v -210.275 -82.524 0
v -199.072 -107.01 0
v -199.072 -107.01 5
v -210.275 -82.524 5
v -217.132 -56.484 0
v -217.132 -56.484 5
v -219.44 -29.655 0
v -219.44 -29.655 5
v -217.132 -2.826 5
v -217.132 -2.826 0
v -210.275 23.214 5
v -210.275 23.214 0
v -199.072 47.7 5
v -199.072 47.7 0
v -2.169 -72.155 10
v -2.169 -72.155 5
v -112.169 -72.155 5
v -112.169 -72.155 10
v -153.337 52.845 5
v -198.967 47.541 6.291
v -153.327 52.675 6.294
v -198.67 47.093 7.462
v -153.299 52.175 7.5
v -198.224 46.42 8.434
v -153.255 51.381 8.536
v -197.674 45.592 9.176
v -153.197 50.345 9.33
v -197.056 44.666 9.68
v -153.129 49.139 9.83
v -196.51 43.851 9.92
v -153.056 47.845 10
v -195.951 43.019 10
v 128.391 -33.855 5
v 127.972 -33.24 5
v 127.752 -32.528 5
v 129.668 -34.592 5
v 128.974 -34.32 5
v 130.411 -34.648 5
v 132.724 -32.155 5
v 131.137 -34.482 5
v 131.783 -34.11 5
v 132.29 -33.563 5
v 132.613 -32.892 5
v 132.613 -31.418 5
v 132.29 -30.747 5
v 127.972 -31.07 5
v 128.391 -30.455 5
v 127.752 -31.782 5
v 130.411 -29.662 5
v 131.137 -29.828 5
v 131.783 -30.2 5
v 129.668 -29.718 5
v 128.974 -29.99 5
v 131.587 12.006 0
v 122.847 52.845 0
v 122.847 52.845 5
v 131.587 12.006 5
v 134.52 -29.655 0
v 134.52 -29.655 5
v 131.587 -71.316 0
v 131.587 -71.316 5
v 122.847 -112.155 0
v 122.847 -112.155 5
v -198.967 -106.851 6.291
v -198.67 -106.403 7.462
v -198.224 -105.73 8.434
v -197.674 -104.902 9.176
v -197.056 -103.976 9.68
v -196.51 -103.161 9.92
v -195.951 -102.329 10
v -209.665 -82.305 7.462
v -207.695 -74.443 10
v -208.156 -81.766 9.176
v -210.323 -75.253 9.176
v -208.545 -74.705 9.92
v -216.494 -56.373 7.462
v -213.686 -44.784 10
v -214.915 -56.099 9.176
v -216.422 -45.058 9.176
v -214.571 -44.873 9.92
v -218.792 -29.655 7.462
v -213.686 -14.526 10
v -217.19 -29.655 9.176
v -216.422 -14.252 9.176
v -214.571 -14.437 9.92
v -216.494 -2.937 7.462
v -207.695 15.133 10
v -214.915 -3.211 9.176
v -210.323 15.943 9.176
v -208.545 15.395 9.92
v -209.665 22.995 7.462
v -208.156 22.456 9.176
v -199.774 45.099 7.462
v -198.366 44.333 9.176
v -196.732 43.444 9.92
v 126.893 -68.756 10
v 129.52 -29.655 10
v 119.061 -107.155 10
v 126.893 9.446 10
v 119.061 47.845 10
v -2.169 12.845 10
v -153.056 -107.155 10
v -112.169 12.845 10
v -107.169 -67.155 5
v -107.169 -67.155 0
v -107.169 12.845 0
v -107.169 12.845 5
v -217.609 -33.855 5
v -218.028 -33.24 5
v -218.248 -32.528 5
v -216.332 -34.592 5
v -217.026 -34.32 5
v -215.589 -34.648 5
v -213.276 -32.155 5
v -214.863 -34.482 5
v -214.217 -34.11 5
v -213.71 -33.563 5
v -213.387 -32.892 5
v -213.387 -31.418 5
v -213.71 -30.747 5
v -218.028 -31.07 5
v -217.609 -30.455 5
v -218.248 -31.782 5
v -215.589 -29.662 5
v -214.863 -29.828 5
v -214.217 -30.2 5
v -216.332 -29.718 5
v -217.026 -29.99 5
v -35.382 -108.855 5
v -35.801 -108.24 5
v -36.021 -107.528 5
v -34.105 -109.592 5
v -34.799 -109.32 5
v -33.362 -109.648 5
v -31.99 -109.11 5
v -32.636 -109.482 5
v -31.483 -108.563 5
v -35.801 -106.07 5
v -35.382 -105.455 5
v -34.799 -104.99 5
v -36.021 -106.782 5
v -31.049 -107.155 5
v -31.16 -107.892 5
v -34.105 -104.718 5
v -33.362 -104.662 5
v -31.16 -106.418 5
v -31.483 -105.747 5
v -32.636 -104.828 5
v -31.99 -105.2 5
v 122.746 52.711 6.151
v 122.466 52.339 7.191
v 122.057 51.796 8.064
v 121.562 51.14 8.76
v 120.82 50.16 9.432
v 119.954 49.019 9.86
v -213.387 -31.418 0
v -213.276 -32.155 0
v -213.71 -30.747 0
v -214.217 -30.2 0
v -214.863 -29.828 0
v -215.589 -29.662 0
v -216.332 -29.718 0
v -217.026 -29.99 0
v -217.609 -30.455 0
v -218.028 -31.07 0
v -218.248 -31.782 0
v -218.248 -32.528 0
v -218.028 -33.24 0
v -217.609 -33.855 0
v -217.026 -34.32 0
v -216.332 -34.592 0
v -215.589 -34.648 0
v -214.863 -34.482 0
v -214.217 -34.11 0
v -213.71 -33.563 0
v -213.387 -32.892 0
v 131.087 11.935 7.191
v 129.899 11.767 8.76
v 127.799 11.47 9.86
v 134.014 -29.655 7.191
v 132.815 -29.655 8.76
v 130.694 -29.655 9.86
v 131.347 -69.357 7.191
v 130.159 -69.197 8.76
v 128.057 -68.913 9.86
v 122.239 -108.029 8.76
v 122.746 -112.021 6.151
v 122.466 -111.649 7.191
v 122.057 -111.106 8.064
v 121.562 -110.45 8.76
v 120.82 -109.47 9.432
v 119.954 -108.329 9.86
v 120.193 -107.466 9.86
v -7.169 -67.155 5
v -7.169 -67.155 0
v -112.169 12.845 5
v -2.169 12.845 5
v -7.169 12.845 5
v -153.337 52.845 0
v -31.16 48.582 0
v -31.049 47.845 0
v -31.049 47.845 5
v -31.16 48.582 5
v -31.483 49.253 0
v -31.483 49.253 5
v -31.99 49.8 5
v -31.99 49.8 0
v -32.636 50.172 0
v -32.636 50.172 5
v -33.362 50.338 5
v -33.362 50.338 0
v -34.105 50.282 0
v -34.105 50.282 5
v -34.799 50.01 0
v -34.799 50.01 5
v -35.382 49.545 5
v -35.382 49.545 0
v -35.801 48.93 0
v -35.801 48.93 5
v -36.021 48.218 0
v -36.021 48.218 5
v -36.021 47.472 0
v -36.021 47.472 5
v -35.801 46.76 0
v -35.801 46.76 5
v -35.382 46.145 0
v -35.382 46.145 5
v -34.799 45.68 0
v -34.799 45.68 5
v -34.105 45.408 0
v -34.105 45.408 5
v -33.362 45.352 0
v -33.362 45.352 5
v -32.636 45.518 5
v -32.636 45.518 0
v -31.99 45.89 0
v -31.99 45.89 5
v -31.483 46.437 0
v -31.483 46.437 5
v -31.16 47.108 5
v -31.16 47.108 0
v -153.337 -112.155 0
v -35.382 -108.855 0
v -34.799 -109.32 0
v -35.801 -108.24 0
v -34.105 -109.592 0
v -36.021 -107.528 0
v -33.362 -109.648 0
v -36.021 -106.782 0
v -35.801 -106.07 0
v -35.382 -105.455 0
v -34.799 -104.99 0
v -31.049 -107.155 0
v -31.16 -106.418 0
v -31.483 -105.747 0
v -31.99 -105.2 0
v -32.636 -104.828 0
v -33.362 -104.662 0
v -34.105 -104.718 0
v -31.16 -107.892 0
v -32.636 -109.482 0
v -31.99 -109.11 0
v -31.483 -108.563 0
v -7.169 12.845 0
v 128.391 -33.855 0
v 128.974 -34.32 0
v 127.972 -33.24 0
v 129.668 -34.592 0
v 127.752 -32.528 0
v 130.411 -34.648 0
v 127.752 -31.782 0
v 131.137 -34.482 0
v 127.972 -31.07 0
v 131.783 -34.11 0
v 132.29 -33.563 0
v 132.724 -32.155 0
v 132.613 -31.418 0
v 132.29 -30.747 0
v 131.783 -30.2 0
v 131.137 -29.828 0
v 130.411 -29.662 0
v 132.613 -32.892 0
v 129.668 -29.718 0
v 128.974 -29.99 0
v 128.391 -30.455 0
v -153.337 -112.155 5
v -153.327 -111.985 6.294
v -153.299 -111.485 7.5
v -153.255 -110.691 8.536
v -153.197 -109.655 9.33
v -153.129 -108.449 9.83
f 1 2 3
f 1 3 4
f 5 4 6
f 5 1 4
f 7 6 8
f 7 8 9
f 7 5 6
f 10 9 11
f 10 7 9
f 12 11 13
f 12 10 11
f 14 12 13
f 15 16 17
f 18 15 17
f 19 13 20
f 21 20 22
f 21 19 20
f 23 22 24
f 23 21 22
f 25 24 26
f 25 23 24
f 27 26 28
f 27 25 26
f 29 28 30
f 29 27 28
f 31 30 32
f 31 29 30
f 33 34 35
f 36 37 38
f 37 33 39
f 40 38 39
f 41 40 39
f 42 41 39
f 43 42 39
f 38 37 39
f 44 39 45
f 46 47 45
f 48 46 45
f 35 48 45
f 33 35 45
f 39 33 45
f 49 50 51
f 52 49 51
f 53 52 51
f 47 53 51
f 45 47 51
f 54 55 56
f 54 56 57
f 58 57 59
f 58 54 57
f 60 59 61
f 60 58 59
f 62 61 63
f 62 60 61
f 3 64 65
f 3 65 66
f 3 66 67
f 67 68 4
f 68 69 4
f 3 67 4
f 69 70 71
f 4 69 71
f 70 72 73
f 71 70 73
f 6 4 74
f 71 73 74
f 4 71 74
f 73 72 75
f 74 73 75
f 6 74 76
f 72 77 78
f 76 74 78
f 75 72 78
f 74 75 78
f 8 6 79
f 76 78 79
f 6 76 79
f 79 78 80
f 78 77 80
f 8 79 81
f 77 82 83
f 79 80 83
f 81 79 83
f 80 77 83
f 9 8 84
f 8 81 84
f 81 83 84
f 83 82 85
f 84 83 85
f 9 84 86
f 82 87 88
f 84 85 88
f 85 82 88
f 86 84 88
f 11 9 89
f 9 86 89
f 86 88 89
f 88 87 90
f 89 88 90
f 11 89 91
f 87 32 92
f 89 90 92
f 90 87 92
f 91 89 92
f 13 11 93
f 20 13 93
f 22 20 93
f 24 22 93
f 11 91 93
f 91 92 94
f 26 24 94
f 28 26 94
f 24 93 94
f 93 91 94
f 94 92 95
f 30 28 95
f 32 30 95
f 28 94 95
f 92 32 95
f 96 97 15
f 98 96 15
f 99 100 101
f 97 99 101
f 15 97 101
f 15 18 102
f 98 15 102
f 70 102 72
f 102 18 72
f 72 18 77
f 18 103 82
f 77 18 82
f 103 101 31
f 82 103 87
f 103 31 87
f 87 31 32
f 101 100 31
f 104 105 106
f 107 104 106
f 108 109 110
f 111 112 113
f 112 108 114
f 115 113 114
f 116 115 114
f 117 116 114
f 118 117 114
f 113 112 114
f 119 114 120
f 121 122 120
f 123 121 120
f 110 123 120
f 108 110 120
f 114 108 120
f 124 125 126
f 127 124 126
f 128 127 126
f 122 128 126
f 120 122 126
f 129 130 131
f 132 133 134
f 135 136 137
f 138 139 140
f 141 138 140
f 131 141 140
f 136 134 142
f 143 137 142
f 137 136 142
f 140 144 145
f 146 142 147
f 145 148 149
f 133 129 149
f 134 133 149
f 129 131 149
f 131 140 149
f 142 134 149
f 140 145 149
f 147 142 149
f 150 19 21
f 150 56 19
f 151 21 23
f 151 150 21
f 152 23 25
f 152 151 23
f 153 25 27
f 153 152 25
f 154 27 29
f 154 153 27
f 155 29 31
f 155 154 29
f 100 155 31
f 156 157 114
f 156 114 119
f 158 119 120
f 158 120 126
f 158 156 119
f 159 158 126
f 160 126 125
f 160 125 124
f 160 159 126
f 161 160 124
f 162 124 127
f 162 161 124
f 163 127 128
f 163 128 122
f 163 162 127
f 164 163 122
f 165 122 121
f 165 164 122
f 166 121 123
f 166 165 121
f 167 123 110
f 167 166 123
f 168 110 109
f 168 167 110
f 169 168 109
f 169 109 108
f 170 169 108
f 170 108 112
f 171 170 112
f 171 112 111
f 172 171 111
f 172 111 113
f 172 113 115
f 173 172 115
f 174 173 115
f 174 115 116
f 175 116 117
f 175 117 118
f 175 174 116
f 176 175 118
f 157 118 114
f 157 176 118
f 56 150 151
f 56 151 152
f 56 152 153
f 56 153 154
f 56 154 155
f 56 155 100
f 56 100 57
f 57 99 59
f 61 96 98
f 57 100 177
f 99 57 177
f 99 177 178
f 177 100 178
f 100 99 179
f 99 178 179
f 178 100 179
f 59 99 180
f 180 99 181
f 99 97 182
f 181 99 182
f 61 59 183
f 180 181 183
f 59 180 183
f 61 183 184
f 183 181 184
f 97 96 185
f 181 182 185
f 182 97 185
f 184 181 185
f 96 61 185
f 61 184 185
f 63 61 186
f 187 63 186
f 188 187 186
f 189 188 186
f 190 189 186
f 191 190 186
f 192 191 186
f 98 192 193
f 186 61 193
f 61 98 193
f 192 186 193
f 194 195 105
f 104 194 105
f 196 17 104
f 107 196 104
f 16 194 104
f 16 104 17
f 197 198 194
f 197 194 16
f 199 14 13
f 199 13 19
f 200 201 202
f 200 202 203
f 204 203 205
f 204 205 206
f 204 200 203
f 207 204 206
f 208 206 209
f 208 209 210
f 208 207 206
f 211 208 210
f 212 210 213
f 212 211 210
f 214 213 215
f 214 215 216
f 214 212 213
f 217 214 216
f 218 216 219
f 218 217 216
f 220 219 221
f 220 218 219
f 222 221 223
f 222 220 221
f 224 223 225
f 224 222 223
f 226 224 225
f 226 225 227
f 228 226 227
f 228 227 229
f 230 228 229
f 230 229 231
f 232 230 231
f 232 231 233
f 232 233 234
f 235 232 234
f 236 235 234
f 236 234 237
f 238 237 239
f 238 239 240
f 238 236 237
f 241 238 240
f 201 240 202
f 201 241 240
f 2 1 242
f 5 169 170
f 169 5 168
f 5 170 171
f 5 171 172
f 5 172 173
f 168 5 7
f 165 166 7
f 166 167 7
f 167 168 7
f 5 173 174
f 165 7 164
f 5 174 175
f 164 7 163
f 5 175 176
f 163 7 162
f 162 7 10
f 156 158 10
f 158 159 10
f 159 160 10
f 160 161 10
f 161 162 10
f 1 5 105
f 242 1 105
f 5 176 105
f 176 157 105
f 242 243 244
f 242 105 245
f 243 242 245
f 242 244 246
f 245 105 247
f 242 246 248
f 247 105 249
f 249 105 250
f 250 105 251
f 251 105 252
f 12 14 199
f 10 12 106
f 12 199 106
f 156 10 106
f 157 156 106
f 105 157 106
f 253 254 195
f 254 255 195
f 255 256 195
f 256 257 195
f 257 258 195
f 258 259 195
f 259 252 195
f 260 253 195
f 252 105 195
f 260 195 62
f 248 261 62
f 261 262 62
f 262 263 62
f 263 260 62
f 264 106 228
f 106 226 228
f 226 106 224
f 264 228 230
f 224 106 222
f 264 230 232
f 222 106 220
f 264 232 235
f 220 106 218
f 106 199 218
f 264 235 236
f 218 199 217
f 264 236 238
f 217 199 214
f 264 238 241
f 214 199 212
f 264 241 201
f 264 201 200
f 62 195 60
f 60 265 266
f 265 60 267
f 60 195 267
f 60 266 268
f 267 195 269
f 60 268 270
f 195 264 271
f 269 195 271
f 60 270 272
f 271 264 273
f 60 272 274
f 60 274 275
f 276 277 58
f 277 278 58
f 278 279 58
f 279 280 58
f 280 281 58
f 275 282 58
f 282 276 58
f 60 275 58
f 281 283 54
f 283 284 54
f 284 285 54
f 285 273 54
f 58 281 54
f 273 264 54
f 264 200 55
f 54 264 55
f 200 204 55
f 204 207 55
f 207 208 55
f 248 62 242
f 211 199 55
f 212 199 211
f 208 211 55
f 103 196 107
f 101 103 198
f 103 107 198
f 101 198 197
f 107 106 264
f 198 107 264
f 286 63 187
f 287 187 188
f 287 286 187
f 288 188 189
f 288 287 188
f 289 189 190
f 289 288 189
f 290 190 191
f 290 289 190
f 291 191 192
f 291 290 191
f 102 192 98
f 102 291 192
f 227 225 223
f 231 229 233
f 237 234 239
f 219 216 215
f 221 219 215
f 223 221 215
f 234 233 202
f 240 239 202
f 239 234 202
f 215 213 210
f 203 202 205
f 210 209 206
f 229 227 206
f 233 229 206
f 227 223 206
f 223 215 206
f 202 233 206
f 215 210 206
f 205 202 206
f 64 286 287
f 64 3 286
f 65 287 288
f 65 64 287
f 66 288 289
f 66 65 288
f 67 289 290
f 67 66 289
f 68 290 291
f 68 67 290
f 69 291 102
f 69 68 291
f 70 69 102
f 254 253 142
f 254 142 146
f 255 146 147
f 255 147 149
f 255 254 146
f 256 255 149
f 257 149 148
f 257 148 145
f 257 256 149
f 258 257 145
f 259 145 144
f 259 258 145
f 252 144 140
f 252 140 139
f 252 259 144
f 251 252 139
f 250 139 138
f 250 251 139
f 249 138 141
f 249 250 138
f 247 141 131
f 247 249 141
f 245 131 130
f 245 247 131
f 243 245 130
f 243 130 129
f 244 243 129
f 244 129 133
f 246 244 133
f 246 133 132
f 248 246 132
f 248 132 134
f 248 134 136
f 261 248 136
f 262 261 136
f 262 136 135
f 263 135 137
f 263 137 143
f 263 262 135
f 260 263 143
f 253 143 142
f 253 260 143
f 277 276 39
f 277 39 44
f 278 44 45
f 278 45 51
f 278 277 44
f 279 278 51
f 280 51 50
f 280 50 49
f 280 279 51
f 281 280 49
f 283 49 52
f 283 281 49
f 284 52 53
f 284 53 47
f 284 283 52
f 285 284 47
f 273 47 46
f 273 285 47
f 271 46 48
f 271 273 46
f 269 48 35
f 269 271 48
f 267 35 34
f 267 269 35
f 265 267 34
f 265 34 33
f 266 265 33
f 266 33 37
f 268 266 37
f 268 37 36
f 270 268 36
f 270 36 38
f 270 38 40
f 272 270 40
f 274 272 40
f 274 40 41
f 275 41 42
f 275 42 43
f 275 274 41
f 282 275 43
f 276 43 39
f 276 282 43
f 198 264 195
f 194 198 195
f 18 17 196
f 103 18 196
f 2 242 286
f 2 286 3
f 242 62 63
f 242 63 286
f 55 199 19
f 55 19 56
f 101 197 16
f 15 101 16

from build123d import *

# Parameters (mm, degrees)
EXTRU_MINCE1_DEPTH      = 10
ESQUISSE1_25_W          = 110
ESQUISSE1_25_H          = 85
BOSS_EXTRU_3_DEPTH      = 10
ESQUISSE1_26_R          = 2.5
ENL_V_MAT_EXTRU_1_DEPTH = 5
ESQUISSE1_27_R          = 2.5
ENL_V_MAT_EXTRU_2_DEPTH = 5
ESQUISSE1_28_R          = 2.5
ENL_V_MAT_EXTRU_3_DEPTH = 5
ESQUISSE1_29_R          = 2.5
ENL_V_MAT_EXTRU_4_DEPTH = 5
CONG_5_R                = 5
BOSS_EXTRU_4_DEPTH      = 5


with BuildPart() as part:
    # Esquisse1 → Extru.-Mince1 (new body)
    with BuildSketch(Plane.XY):
        with BuildLine():
            Line((-199.071776485, 47.699787448), (-153.336718001, 52.844981528))
            Line((-153.336718001, 52.844981528), (122.846559315, 52.844981528))
            ThreePointArc((122.846559315, 52.844981528), (134.520037722, -29.655018472), (122.846559315, -112.155018472))
            Line((122.846559315, -112.155018472), (-153.336718001, -112.155018472))
            Line((-153.336718001, -112.155018472), (-199.071776485, -107.009824393))
            ThreePointArc((-199.071776485, -107.009824393), (-219.440219924, -29.655018472), (-199.071776485, 47.699787448))
        make_face()
        with BuildLine():
            Line((-192.775986612, 38.344981528), (-152.775986612, 42.844981528))
            Line((-152.775986612, 42.844981528), (115.224013388, 42.844981528))
            ThreePointArc((115.224013388, 42.844981528), (124.520037722, -29.655018472), (115.224013388, -102.155018472))
            Line((115.224013388, -102.155018472), (-152.775986612, -102.155018472))
            Line((-152.775986612, -102.155018472), (-192.775986612, -97.655018472))
            ThreePointArc((-192.775986612, -97.655018472), (-209.440219924, -29.655018472), (-192.775986612, 38.344981528))
        make_face(mode=Mode.SUBTRACT)
    extrude(amount=EXTRU_MINCE1_DEPTH)

    # Esquisse1<25> → Boss.-Extru.3 (add)
    with BuildSketch(Plane.XY):
        with BuildLine():
            Line((-152.775986612, 42.844981528), (-192.775986612, 38.344981528))
            ThreePointArc((-192.775986612, 38.344981528), (-209.440219924, -29.655018472), (-192.775986612, -97.655018472))
            Line((-192.775986612, -97.655018472), (-152.775986612, -102.155018472))
            Line((-152.775986612, -102.155018472), (115.224013388, -102.155018472))
            ThreePointArc((115.224013388, -102.155018472), (124.520037722, -29.655018472), (115.224013388, 42.844981528))
            Line((115.224013388, 42.844981528), (-152.775986612, 42.844981528))
        make_face()
        with Locations((-57.169243918, -29.655018472)):
            Rectangle(ESQUISSE1_25_W, ESQUISSE1_25_H, mode=Mode.SUBTRACT)
    extrude(amount=BOSS_EXTRU_3_DEPTH)

    # Esquisse1<26> → Enlèv. mat.-Extru.1 (cut)
    with BuildSketch(Plane.XY):
        with Locations((130.224013388, -32.155018472)):
            Circle(ESQUISSE1_26_R)
    extrude(amount=ENL_V_MAT_EXTRU_1_DEPTH, mode=Mode.SUBTRACT)

    # Esquisse1<27> → Enlèv. mat.-Extru.2 (cut)
    with BuildSketch(Plane.XY):
        with Locations((-33.549027095, -107.155018472)):
            Circle(ESQUISSE1_27_R)
    extrude(amount=ENL_V_MAT_EXTRU_2_DEPTH, mode=Mode.SUBTRACT)

    # Esquisse1<28> → Enlèv. mat.-Extru.3 (cut)
    with BuildSketch(Plane.XY):
        with Locations((-33.549027095, 47.844981528)):
            Circle(ESQUISSE1_28_R)
    extrude(amount=ENL_V_MAT_EXTRU_3_DEPTH, mode=Mode.SUBTRACT)

    # Esquisse1<29> → Enlèv. mat.-Extru.4 (cut)
    with BuildSketch(Plane.XY):
        with Locations((-215.775986612, -32.155018472)):
            Circle(ESQUISSE1_29_R)
    extrude(amount=ENL_V_MAT_EXTRU_4_DEPTH, mode=Mode.SUBTRACT)

    # Congé5
    cong_5_edges = [part.edges().sort_by_distance(p)[0] for p in [
        (-219.440219924, -29.655018472, 10),
        (-176.204247243, 50.272384488, 10),
        (-15.245079343, 52.844981528, 10),
        (134.520037722, -29.655018472, 10),
        (-15.245079343, -112.155018472, 10),
        (-176.204247243, -109.582421433, 10),
    ]]
    fillet(cong_5_edges, radius=CONG_5_R)

    # Esquisse1<30> → Boss.-Extru.4 (add)
    with BuildSketch(Plane.XY):
        Polygon((-7.169243918, -67.155018472), (-107.169243918, -67.155018472), (-107.169243918, 12.844981528), (-112.169243918, 12.844981528), (-112.169243918, -72.155018472), (-2.169243918, -72.155018472), (-2.169243918, 12.844981528), (-7.169243918, 12.844981528), align=None)
    extrude(amount=BOSS_EXTRU_4_DEPTH)


solid = part.part
